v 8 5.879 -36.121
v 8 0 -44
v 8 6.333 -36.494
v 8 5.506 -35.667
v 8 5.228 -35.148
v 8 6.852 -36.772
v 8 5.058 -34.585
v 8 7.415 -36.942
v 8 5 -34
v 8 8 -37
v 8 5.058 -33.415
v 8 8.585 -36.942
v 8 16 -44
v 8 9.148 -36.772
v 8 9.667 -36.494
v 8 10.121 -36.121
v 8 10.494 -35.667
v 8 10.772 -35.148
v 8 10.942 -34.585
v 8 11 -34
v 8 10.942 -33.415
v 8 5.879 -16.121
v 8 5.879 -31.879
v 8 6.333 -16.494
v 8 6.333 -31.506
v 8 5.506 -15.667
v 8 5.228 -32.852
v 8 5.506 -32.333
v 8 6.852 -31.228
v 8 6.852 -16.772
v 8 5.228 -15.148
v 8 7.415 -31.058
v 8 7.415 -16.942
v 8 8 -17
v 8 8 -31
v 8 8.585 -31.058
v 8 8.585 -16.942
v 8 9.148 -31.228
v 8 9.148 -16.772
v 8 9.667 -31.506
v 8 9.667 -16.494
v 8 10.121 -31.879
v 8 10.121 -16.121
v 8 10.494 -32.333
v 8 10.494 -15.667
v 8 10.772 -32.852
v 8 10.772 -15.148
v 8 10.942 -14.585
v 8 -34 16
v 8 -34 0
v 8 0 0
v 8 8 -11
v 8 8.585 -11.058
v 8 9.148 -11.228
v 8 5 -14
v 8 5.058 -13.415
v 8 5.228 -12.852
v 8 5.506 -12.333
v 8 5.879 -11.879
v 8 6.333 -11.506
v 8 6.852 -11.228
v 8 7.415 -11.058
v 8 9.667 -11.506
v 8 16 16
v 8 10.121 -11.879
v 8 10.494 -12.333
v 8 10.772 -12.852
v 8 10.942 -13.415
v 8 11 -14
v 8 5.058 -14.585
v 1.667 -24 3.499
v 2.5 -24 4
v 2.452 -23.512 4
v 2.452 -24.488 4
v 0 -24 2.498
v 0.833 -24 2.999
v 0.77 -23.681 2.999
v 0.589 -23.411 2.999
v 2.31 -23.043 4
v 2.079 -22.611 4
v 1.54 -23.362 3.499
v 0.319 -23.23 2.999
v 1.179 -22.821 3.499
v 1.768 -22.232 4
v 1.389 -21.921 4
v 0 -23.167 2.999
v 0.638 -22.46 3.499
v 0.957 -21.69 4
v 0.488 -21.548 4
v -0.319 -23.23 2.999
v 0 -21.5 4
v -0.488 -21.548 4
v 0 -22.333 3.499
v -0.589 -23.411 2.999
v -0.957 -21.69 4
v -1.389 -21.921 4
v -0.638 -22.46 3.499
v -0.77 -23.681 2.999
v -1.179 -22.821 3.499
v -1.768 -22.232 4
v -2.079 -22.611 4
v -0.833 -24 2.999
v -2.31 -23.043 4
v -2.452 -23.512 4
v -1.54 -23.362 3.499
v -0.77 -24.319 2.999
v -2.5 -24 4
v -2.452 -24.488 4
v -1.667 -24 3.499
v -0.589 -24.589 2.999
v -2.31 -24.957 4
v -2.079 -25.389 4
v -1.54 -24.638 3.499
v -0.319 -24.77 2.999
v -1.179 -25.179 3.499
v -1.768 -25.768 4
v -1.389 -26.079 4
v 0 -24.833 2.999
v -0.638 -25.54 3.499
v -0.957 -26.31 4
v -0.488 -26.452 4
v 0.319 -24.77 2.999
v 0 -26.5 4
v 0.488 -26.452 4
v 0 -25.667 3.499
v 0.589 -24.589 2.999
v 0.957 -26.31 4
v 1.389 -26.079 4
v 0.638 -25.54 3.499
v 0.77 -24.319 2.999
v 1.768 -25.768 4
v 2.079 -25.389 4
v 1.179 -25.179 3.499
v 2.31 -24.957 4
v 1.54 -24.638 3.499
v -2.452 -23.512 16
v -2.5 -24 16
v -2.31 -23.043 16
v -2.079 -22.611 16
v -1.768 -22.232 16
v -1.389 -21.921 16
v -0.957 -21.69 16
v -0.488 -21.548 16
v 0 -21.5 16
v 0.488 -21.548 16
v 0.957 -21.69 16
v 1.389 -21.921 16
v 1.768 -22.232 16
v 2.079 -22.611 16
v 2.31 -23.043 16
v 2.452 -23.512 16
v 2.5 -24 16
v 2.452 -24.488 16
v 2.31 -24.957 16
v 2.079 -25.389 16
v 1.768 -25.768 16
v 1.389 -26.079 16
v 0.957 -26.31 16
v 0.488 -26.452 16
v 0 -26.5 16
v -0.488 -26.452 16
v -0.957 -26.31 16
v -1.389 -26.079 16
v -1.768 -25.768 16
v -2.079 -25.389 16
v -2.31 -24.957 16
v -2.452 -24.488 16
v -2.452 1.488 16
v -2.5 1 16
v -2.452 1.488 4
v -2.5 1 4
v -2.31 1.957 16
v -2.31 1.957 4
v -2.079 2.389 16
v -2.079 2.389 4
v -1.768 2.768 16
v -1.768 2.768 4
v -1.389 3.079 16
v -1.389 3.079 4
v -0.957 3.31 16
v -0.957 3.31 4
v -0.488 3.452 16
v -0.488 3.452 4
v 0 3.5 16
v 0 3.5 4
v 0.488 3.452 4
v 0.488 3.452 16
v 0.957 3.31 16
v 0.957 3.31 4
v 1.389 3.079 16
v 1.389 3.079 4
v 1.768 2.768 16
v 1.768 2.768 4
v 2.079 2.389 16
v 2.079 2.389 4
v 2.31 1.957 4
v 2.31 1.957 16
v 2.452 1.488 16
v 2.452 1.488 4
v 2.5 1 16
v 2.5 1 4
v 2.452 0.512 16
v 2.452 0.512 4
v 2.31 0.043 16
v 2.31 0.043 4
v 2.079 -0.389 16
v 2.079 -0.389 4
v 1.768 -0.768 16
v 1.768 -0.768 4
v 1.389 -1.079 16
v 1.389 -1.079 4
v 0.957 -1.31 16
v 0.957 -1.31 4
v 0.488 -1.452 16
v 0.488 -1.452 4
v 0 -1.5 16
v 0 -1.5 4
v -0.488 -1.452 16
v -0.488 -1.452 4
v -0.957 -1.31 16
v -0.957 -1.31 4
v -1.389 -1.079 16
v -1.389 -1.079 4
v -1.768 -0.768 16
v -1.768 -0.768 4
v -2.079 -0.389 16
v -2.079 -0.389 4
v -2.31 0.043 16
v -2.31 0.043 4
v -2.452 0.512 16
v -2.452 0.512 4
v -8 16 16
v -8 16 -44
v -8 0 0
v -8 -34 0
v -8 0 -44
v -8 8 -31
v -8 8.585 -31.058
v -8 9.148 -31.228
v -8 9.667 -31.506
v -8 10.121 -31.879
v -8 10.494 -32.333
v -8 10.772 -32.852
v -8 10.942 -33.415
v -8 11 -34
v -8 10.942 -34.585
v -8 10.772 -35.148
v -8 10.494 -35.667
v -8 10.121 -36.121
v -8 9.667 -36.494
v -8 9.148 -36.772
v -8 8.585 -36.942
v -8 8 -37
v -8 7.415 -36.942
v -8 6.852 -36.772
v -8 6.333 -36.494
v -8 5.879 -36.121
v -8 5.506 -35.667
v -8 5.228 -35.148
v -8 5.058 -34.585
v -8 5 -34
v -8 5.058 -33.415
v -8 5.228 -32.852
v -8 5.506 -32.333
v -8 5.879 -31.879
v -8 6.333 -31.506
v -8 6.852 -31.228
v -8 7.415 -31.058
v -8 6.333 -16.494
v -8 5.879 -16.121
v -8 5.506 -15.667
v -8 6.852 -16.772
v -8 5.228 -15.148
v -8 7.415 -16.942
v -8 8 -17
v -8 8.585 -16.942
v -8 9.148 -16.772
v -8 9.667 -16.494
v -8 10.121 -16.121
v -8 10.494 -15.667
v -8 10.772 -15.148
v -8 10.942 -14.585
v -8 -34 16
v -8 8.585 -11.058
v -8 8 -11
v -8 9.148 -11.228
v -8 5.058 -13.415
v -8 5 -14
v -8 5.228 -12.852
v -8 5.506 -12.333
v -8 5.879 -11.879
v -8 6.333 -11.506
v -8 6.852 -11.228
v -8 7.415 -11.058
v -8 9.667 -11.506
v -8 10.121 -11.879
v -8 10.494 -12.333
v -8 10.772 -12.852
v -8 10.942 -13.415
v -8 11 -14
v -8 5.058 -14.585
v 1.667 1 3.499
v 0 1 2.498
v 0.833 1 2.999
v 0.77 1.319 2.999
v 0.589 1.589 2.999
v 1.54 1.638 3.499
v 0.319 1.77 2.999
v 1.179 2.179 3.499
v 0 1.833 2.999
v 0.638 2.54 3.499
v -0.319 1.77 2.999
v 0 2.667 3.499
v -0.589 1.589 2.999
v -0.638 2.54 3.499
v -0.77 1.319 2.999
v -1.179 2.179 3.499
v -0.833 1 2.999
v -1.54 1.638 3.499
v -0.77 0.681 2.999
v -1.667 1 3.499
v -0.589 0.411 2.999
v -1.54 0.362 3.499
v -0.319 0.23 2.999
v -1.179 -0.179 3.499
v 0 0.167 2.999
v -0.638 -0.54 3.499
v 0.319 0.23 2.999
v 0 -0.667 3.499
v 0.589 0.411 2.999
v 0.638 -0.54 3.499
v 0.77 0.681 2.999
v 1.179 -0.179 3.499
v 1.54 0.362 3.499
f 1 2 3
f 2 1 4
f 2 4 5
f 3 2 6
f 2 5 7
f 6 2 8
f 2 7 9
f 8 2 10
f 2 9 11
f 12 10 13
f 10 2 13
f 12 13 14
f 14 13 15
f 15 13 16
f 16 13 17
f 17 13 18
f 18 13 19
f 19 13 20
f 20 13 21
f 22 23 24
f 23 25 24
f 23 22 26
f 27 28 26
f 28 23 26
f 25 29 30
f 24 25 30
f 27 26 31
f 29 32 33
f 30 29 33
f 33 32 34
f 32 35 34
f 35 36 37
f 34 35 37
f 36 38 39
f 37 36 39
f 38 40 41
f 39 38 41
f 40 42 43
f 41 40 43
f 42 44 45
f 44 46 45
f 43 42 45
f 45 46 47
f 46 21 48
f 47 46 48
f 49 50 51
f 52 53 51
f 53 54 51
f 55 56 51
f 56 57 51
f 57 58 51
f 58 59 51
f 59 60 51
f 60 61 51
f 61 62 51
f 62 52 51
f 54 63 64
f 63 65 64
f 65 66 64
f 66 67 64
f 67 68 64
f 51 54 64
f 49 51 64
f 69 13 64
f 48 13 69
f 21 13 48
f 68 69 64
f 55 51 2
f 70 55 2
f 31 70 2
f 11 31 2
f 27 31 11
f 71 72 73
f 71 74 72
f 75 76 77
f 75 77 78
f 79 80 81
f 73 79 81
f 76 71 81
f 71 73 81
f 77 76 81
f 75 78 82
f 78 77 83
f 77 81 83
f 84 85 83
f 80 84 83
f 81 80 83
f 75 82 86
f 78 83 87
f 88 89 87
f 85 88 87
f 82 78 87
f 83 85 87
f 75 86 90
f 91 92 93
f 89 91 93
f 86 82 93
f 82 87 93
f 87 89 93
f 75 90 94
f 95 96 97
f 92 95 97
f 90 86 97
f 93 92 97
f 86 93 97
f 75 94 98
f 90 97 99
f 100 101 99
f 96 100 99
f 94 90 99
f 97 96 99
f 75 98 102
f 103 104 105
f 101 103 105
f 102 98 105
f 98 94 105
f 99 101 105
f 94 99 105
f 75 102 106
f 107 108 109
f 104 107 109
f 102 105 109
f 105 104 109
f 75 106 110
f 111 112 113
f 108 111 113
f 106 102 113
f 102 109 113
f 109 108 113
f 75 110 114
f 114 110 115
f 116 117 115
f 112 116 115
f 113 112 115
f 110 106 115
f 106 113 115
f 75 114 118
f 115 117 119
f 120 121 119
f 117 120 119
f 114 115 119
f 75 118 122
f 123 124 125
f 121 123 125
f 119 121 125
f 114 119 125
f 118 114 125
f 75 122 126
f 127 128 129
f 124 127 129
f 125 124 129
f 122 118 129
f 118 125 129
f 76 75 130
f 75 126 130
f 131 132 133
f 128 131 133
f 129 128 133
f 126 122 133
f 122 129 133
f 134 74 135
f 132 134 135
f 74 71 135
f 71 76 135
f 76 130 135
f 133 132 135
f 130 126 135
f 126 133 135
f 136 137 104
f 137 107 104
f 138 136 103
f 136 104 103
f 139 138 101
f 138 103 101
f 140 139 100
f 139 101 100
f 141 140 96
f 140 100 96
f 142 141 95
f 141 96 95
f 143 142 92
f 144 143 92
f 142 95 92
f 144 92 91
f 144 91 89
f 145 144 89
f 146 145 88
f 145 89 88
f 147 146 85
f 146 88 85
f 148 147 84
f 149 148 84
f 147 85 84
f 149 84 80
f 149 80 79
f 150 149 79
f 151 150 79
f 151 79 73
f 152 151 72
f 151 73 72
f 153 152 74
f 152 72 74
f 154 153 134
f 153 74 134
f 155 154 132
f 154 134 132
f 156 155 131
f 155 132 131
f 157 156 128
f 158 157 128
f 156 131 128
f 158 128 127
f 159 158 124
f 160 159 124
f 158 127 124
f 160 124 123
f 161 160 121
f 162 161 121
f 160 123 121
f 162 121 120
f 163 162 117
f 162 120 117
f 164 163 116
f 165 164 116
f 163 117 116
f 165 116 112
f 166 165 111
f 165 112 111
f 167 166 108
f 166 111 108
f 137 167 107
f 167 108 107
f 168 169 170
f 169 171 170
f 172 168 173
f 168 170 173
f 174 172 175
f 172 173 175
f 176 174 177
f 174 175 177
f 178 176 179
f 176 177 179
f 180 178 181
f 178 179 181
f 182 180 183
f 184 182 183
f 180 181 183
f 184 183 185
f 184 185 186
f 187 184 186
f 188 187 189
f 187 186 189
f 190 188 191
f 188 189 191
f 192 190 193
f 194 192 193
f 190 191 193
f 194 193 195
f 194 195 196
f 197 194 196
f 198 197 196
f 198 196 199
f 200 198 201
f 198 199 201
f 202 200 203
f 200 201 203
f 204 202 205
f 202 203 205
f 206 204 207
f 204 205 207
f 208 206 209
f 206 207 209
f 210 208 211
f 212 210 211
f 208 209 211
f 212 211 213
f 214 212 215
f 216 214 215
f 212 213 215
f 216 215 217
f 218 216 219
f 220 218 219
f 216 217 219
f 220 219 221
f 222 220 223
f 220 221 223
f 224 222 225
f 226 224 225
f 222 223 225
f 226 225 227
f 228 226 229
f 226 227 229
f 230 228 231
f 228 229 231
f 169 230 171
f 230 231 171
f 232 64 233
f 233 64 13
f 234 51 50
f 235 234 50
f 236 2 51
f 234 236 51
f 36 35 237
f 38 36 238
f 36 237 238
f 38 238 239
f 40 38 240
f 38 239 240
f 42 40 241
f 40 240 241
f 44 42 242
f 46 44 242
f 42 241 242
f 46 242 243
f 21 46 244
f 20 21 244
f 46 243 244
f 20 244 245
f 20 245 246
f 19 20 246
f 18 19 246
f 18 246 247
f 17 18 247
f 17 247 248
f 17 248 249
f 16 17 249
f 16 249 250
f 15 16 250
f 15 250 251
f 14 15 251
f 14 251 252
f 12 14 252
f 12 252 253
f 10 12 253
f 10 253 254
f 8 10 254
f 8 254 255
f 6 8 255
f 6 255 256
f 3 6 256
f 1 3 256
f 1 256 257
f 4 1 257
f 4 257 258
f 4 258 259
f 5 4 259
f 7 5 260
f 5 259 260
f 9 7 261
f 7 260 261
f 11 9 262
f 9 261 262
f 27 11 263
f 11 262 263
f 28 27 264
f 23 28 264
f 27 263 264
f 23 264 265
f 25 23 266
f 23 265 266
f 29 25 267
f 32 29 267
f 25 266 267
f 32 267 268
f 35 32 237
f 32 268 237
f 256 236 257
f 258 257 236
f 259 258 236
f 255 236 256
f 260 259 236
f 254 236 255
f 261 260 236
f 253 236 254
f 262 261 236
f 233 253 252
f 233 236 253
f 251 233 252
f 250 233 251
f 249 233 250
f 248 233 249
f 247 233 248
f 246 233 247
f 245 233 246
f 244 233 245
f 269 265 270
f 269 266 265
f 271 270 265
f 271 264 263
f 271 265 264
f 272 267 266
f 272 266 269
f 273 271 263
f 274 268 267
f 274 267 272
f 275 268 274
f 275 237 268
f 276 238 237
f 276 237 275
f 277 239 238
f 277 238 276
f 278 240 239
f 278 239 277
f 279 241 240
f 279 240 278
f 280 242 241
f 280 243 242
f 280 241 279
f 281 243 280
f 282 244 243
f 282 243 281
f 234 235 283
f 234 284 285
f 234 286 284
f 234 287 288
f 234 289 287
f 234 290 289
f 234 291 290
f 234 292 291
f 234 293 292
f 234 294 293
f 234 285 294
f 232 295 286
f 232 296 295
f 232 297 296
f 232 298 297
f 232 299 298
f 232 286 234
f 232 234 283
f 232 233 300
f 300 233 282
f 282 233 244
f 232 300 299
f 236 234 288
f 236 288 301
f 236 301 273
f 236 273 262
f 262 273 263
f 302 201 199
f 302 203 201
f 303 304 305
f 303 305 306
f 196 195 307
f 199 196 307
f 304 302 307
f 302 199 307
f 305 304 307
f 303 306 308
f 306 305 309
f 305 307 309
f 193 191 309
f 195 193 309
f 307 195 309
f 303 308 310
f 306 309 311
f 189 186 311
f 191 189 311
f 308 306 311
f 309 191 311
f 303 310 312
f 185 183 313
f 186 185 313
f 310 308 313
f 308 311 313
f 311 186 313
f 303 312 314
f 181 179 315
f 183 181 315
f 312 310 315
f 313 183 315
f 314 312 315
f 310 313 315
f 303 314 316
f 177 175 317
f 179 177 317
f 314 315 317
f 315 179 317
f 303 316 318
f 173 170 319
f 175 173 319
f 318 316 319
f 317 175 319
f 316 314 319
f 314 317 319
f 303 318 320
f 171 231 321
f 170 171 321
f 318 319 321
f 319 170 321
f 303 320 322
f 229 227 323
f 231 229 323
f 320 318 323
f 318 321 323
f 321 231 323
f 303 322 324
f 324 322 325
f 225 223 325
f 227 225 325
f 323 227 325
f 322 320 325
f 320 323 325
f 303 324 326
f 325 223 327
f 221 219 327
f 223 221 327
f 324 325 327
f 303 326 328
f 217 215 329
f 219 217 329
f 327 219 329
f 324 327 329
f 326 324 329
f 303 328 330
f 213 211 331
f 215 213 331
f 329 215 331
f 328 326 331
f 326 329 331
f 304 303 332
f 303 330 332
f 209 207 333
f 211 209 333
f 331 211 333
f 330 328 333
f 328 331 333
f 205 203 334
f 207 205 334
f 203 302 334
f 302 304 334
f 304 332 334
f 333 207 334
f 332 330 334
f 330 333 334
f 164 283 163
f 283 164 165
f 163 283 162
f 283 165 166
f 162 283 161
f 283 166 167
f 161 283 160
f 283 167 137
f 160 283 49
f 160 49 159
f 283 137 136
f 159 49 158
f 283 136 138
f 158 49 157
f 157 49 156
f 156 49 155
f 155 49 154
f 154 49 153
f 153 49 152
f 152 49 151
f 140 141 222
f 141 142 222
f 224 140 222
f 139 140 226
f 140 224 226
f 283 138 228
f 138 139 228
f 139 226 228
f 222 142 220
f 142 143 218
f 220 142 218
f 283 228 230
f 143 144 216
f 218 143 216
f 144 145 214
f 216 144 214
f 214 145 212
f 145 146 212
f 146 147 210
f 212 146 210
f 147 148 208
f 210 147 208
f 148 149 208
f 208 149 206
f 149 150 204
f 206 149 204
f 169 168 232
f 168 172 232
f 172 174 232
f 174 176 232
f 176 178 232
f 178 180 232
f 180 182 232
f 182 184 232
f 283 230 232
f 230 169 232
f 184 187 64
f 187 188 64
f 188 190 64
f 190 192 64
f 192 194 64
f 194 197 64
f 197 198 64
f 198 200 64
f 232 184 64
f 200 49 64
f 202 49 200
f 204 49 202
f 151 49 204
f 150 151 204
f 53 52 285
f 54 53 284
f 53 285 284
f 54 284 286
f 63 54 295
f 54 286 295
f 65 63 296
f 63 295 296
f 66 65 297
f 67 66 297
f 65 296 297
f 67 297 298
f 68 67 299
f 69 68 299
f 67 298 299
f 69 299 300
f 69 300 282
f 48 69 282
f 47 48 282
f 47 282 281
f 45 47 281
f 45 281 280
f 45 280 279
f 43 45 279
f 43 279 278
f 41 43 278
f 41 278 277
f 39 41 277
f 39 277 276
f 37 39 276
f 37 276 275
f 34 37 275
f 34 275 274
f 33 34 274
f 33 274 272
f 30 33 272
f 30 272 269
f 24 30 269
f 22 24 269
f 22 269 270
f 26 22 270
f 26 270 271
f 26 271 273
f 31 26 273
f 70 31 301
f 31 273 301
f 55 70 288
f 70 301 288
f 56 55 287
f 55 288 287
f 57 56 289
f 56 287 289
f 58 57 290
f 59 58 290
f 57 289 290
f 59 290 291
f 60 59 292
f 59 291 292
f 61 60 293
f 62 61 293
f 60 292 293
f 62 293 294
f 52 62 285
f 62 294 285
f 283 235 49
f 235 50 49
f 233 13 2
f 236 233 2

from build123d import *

# Parameters (mm, degrees)
BOSS_EXTRUDE1_DEPTH          = 8
SKETCH2_R                    = 3
CUT_EXTRUDE1_DEPTH           = 58.861904566
F_5_0_5_DIAMETER_HOLE2_D     = 5
F_5_0_5_DIAMETER_HOLE2_DEPTH = 12
F_5_0_5_DIAMETER_HOLE2_TIP   = 1.502151548


with BuildPart() as part:
    # Sketch1 → Boss-Extrude1 (new, symmetric)
    with BuildSketch(Plane(origin=(0, 0, 0), x_dir=(0, 0, -1), z_dir=(1, 0, 0))):
        Polygon((0, 0), (0, -34), (-16, -34), (-16, 16), (44, 16), (44, 0), align=None)
    extrude(amount=BOSS_EXTRUDE1_DEPTH, both=True)

    # Sketch2 → Cut-Extrude1 (cut, through all)
    with BuildSketch(Plane.ZY.offset(8)):
        with Locations((-34, 8)):
            Circle(SKETCH2_R)
        with Locations((-14, 8)):
            Circle(SKETCH2_R)
    extrude(amount=-CUT_EXTRUDE1_DEPTH, mode=Mode.SUBTRACT)

    # Ø5.0 (5) Diameter Hole2
    with Locations(Plane(origin=(0, 1, 16), x_dir=(1, 0, 0), z_dir=(0, 0, 1))):
        with Locations((0, 0), (0, -25)):
            Hole(F_5_0_5_DIAMETER_HOLE2_D / 2, depth=F_5_0_5_DIAMETER_HOLE2_DEPTH)
            with Locations((0, 0, -(F_5_0_5_DIAMETER_HOLE2_DEPTH + F_5_0_5_DIAMETER_HOLE2_TIP / 2))):  # 118° drill point
                Cone(0, F_5_0_5_DIAMETER_HOLE2_D / 2, F_5_0_5_DIAMETER_HOLE2_TIP, mode=Mode.SUBTRACT)


solid = part.part
